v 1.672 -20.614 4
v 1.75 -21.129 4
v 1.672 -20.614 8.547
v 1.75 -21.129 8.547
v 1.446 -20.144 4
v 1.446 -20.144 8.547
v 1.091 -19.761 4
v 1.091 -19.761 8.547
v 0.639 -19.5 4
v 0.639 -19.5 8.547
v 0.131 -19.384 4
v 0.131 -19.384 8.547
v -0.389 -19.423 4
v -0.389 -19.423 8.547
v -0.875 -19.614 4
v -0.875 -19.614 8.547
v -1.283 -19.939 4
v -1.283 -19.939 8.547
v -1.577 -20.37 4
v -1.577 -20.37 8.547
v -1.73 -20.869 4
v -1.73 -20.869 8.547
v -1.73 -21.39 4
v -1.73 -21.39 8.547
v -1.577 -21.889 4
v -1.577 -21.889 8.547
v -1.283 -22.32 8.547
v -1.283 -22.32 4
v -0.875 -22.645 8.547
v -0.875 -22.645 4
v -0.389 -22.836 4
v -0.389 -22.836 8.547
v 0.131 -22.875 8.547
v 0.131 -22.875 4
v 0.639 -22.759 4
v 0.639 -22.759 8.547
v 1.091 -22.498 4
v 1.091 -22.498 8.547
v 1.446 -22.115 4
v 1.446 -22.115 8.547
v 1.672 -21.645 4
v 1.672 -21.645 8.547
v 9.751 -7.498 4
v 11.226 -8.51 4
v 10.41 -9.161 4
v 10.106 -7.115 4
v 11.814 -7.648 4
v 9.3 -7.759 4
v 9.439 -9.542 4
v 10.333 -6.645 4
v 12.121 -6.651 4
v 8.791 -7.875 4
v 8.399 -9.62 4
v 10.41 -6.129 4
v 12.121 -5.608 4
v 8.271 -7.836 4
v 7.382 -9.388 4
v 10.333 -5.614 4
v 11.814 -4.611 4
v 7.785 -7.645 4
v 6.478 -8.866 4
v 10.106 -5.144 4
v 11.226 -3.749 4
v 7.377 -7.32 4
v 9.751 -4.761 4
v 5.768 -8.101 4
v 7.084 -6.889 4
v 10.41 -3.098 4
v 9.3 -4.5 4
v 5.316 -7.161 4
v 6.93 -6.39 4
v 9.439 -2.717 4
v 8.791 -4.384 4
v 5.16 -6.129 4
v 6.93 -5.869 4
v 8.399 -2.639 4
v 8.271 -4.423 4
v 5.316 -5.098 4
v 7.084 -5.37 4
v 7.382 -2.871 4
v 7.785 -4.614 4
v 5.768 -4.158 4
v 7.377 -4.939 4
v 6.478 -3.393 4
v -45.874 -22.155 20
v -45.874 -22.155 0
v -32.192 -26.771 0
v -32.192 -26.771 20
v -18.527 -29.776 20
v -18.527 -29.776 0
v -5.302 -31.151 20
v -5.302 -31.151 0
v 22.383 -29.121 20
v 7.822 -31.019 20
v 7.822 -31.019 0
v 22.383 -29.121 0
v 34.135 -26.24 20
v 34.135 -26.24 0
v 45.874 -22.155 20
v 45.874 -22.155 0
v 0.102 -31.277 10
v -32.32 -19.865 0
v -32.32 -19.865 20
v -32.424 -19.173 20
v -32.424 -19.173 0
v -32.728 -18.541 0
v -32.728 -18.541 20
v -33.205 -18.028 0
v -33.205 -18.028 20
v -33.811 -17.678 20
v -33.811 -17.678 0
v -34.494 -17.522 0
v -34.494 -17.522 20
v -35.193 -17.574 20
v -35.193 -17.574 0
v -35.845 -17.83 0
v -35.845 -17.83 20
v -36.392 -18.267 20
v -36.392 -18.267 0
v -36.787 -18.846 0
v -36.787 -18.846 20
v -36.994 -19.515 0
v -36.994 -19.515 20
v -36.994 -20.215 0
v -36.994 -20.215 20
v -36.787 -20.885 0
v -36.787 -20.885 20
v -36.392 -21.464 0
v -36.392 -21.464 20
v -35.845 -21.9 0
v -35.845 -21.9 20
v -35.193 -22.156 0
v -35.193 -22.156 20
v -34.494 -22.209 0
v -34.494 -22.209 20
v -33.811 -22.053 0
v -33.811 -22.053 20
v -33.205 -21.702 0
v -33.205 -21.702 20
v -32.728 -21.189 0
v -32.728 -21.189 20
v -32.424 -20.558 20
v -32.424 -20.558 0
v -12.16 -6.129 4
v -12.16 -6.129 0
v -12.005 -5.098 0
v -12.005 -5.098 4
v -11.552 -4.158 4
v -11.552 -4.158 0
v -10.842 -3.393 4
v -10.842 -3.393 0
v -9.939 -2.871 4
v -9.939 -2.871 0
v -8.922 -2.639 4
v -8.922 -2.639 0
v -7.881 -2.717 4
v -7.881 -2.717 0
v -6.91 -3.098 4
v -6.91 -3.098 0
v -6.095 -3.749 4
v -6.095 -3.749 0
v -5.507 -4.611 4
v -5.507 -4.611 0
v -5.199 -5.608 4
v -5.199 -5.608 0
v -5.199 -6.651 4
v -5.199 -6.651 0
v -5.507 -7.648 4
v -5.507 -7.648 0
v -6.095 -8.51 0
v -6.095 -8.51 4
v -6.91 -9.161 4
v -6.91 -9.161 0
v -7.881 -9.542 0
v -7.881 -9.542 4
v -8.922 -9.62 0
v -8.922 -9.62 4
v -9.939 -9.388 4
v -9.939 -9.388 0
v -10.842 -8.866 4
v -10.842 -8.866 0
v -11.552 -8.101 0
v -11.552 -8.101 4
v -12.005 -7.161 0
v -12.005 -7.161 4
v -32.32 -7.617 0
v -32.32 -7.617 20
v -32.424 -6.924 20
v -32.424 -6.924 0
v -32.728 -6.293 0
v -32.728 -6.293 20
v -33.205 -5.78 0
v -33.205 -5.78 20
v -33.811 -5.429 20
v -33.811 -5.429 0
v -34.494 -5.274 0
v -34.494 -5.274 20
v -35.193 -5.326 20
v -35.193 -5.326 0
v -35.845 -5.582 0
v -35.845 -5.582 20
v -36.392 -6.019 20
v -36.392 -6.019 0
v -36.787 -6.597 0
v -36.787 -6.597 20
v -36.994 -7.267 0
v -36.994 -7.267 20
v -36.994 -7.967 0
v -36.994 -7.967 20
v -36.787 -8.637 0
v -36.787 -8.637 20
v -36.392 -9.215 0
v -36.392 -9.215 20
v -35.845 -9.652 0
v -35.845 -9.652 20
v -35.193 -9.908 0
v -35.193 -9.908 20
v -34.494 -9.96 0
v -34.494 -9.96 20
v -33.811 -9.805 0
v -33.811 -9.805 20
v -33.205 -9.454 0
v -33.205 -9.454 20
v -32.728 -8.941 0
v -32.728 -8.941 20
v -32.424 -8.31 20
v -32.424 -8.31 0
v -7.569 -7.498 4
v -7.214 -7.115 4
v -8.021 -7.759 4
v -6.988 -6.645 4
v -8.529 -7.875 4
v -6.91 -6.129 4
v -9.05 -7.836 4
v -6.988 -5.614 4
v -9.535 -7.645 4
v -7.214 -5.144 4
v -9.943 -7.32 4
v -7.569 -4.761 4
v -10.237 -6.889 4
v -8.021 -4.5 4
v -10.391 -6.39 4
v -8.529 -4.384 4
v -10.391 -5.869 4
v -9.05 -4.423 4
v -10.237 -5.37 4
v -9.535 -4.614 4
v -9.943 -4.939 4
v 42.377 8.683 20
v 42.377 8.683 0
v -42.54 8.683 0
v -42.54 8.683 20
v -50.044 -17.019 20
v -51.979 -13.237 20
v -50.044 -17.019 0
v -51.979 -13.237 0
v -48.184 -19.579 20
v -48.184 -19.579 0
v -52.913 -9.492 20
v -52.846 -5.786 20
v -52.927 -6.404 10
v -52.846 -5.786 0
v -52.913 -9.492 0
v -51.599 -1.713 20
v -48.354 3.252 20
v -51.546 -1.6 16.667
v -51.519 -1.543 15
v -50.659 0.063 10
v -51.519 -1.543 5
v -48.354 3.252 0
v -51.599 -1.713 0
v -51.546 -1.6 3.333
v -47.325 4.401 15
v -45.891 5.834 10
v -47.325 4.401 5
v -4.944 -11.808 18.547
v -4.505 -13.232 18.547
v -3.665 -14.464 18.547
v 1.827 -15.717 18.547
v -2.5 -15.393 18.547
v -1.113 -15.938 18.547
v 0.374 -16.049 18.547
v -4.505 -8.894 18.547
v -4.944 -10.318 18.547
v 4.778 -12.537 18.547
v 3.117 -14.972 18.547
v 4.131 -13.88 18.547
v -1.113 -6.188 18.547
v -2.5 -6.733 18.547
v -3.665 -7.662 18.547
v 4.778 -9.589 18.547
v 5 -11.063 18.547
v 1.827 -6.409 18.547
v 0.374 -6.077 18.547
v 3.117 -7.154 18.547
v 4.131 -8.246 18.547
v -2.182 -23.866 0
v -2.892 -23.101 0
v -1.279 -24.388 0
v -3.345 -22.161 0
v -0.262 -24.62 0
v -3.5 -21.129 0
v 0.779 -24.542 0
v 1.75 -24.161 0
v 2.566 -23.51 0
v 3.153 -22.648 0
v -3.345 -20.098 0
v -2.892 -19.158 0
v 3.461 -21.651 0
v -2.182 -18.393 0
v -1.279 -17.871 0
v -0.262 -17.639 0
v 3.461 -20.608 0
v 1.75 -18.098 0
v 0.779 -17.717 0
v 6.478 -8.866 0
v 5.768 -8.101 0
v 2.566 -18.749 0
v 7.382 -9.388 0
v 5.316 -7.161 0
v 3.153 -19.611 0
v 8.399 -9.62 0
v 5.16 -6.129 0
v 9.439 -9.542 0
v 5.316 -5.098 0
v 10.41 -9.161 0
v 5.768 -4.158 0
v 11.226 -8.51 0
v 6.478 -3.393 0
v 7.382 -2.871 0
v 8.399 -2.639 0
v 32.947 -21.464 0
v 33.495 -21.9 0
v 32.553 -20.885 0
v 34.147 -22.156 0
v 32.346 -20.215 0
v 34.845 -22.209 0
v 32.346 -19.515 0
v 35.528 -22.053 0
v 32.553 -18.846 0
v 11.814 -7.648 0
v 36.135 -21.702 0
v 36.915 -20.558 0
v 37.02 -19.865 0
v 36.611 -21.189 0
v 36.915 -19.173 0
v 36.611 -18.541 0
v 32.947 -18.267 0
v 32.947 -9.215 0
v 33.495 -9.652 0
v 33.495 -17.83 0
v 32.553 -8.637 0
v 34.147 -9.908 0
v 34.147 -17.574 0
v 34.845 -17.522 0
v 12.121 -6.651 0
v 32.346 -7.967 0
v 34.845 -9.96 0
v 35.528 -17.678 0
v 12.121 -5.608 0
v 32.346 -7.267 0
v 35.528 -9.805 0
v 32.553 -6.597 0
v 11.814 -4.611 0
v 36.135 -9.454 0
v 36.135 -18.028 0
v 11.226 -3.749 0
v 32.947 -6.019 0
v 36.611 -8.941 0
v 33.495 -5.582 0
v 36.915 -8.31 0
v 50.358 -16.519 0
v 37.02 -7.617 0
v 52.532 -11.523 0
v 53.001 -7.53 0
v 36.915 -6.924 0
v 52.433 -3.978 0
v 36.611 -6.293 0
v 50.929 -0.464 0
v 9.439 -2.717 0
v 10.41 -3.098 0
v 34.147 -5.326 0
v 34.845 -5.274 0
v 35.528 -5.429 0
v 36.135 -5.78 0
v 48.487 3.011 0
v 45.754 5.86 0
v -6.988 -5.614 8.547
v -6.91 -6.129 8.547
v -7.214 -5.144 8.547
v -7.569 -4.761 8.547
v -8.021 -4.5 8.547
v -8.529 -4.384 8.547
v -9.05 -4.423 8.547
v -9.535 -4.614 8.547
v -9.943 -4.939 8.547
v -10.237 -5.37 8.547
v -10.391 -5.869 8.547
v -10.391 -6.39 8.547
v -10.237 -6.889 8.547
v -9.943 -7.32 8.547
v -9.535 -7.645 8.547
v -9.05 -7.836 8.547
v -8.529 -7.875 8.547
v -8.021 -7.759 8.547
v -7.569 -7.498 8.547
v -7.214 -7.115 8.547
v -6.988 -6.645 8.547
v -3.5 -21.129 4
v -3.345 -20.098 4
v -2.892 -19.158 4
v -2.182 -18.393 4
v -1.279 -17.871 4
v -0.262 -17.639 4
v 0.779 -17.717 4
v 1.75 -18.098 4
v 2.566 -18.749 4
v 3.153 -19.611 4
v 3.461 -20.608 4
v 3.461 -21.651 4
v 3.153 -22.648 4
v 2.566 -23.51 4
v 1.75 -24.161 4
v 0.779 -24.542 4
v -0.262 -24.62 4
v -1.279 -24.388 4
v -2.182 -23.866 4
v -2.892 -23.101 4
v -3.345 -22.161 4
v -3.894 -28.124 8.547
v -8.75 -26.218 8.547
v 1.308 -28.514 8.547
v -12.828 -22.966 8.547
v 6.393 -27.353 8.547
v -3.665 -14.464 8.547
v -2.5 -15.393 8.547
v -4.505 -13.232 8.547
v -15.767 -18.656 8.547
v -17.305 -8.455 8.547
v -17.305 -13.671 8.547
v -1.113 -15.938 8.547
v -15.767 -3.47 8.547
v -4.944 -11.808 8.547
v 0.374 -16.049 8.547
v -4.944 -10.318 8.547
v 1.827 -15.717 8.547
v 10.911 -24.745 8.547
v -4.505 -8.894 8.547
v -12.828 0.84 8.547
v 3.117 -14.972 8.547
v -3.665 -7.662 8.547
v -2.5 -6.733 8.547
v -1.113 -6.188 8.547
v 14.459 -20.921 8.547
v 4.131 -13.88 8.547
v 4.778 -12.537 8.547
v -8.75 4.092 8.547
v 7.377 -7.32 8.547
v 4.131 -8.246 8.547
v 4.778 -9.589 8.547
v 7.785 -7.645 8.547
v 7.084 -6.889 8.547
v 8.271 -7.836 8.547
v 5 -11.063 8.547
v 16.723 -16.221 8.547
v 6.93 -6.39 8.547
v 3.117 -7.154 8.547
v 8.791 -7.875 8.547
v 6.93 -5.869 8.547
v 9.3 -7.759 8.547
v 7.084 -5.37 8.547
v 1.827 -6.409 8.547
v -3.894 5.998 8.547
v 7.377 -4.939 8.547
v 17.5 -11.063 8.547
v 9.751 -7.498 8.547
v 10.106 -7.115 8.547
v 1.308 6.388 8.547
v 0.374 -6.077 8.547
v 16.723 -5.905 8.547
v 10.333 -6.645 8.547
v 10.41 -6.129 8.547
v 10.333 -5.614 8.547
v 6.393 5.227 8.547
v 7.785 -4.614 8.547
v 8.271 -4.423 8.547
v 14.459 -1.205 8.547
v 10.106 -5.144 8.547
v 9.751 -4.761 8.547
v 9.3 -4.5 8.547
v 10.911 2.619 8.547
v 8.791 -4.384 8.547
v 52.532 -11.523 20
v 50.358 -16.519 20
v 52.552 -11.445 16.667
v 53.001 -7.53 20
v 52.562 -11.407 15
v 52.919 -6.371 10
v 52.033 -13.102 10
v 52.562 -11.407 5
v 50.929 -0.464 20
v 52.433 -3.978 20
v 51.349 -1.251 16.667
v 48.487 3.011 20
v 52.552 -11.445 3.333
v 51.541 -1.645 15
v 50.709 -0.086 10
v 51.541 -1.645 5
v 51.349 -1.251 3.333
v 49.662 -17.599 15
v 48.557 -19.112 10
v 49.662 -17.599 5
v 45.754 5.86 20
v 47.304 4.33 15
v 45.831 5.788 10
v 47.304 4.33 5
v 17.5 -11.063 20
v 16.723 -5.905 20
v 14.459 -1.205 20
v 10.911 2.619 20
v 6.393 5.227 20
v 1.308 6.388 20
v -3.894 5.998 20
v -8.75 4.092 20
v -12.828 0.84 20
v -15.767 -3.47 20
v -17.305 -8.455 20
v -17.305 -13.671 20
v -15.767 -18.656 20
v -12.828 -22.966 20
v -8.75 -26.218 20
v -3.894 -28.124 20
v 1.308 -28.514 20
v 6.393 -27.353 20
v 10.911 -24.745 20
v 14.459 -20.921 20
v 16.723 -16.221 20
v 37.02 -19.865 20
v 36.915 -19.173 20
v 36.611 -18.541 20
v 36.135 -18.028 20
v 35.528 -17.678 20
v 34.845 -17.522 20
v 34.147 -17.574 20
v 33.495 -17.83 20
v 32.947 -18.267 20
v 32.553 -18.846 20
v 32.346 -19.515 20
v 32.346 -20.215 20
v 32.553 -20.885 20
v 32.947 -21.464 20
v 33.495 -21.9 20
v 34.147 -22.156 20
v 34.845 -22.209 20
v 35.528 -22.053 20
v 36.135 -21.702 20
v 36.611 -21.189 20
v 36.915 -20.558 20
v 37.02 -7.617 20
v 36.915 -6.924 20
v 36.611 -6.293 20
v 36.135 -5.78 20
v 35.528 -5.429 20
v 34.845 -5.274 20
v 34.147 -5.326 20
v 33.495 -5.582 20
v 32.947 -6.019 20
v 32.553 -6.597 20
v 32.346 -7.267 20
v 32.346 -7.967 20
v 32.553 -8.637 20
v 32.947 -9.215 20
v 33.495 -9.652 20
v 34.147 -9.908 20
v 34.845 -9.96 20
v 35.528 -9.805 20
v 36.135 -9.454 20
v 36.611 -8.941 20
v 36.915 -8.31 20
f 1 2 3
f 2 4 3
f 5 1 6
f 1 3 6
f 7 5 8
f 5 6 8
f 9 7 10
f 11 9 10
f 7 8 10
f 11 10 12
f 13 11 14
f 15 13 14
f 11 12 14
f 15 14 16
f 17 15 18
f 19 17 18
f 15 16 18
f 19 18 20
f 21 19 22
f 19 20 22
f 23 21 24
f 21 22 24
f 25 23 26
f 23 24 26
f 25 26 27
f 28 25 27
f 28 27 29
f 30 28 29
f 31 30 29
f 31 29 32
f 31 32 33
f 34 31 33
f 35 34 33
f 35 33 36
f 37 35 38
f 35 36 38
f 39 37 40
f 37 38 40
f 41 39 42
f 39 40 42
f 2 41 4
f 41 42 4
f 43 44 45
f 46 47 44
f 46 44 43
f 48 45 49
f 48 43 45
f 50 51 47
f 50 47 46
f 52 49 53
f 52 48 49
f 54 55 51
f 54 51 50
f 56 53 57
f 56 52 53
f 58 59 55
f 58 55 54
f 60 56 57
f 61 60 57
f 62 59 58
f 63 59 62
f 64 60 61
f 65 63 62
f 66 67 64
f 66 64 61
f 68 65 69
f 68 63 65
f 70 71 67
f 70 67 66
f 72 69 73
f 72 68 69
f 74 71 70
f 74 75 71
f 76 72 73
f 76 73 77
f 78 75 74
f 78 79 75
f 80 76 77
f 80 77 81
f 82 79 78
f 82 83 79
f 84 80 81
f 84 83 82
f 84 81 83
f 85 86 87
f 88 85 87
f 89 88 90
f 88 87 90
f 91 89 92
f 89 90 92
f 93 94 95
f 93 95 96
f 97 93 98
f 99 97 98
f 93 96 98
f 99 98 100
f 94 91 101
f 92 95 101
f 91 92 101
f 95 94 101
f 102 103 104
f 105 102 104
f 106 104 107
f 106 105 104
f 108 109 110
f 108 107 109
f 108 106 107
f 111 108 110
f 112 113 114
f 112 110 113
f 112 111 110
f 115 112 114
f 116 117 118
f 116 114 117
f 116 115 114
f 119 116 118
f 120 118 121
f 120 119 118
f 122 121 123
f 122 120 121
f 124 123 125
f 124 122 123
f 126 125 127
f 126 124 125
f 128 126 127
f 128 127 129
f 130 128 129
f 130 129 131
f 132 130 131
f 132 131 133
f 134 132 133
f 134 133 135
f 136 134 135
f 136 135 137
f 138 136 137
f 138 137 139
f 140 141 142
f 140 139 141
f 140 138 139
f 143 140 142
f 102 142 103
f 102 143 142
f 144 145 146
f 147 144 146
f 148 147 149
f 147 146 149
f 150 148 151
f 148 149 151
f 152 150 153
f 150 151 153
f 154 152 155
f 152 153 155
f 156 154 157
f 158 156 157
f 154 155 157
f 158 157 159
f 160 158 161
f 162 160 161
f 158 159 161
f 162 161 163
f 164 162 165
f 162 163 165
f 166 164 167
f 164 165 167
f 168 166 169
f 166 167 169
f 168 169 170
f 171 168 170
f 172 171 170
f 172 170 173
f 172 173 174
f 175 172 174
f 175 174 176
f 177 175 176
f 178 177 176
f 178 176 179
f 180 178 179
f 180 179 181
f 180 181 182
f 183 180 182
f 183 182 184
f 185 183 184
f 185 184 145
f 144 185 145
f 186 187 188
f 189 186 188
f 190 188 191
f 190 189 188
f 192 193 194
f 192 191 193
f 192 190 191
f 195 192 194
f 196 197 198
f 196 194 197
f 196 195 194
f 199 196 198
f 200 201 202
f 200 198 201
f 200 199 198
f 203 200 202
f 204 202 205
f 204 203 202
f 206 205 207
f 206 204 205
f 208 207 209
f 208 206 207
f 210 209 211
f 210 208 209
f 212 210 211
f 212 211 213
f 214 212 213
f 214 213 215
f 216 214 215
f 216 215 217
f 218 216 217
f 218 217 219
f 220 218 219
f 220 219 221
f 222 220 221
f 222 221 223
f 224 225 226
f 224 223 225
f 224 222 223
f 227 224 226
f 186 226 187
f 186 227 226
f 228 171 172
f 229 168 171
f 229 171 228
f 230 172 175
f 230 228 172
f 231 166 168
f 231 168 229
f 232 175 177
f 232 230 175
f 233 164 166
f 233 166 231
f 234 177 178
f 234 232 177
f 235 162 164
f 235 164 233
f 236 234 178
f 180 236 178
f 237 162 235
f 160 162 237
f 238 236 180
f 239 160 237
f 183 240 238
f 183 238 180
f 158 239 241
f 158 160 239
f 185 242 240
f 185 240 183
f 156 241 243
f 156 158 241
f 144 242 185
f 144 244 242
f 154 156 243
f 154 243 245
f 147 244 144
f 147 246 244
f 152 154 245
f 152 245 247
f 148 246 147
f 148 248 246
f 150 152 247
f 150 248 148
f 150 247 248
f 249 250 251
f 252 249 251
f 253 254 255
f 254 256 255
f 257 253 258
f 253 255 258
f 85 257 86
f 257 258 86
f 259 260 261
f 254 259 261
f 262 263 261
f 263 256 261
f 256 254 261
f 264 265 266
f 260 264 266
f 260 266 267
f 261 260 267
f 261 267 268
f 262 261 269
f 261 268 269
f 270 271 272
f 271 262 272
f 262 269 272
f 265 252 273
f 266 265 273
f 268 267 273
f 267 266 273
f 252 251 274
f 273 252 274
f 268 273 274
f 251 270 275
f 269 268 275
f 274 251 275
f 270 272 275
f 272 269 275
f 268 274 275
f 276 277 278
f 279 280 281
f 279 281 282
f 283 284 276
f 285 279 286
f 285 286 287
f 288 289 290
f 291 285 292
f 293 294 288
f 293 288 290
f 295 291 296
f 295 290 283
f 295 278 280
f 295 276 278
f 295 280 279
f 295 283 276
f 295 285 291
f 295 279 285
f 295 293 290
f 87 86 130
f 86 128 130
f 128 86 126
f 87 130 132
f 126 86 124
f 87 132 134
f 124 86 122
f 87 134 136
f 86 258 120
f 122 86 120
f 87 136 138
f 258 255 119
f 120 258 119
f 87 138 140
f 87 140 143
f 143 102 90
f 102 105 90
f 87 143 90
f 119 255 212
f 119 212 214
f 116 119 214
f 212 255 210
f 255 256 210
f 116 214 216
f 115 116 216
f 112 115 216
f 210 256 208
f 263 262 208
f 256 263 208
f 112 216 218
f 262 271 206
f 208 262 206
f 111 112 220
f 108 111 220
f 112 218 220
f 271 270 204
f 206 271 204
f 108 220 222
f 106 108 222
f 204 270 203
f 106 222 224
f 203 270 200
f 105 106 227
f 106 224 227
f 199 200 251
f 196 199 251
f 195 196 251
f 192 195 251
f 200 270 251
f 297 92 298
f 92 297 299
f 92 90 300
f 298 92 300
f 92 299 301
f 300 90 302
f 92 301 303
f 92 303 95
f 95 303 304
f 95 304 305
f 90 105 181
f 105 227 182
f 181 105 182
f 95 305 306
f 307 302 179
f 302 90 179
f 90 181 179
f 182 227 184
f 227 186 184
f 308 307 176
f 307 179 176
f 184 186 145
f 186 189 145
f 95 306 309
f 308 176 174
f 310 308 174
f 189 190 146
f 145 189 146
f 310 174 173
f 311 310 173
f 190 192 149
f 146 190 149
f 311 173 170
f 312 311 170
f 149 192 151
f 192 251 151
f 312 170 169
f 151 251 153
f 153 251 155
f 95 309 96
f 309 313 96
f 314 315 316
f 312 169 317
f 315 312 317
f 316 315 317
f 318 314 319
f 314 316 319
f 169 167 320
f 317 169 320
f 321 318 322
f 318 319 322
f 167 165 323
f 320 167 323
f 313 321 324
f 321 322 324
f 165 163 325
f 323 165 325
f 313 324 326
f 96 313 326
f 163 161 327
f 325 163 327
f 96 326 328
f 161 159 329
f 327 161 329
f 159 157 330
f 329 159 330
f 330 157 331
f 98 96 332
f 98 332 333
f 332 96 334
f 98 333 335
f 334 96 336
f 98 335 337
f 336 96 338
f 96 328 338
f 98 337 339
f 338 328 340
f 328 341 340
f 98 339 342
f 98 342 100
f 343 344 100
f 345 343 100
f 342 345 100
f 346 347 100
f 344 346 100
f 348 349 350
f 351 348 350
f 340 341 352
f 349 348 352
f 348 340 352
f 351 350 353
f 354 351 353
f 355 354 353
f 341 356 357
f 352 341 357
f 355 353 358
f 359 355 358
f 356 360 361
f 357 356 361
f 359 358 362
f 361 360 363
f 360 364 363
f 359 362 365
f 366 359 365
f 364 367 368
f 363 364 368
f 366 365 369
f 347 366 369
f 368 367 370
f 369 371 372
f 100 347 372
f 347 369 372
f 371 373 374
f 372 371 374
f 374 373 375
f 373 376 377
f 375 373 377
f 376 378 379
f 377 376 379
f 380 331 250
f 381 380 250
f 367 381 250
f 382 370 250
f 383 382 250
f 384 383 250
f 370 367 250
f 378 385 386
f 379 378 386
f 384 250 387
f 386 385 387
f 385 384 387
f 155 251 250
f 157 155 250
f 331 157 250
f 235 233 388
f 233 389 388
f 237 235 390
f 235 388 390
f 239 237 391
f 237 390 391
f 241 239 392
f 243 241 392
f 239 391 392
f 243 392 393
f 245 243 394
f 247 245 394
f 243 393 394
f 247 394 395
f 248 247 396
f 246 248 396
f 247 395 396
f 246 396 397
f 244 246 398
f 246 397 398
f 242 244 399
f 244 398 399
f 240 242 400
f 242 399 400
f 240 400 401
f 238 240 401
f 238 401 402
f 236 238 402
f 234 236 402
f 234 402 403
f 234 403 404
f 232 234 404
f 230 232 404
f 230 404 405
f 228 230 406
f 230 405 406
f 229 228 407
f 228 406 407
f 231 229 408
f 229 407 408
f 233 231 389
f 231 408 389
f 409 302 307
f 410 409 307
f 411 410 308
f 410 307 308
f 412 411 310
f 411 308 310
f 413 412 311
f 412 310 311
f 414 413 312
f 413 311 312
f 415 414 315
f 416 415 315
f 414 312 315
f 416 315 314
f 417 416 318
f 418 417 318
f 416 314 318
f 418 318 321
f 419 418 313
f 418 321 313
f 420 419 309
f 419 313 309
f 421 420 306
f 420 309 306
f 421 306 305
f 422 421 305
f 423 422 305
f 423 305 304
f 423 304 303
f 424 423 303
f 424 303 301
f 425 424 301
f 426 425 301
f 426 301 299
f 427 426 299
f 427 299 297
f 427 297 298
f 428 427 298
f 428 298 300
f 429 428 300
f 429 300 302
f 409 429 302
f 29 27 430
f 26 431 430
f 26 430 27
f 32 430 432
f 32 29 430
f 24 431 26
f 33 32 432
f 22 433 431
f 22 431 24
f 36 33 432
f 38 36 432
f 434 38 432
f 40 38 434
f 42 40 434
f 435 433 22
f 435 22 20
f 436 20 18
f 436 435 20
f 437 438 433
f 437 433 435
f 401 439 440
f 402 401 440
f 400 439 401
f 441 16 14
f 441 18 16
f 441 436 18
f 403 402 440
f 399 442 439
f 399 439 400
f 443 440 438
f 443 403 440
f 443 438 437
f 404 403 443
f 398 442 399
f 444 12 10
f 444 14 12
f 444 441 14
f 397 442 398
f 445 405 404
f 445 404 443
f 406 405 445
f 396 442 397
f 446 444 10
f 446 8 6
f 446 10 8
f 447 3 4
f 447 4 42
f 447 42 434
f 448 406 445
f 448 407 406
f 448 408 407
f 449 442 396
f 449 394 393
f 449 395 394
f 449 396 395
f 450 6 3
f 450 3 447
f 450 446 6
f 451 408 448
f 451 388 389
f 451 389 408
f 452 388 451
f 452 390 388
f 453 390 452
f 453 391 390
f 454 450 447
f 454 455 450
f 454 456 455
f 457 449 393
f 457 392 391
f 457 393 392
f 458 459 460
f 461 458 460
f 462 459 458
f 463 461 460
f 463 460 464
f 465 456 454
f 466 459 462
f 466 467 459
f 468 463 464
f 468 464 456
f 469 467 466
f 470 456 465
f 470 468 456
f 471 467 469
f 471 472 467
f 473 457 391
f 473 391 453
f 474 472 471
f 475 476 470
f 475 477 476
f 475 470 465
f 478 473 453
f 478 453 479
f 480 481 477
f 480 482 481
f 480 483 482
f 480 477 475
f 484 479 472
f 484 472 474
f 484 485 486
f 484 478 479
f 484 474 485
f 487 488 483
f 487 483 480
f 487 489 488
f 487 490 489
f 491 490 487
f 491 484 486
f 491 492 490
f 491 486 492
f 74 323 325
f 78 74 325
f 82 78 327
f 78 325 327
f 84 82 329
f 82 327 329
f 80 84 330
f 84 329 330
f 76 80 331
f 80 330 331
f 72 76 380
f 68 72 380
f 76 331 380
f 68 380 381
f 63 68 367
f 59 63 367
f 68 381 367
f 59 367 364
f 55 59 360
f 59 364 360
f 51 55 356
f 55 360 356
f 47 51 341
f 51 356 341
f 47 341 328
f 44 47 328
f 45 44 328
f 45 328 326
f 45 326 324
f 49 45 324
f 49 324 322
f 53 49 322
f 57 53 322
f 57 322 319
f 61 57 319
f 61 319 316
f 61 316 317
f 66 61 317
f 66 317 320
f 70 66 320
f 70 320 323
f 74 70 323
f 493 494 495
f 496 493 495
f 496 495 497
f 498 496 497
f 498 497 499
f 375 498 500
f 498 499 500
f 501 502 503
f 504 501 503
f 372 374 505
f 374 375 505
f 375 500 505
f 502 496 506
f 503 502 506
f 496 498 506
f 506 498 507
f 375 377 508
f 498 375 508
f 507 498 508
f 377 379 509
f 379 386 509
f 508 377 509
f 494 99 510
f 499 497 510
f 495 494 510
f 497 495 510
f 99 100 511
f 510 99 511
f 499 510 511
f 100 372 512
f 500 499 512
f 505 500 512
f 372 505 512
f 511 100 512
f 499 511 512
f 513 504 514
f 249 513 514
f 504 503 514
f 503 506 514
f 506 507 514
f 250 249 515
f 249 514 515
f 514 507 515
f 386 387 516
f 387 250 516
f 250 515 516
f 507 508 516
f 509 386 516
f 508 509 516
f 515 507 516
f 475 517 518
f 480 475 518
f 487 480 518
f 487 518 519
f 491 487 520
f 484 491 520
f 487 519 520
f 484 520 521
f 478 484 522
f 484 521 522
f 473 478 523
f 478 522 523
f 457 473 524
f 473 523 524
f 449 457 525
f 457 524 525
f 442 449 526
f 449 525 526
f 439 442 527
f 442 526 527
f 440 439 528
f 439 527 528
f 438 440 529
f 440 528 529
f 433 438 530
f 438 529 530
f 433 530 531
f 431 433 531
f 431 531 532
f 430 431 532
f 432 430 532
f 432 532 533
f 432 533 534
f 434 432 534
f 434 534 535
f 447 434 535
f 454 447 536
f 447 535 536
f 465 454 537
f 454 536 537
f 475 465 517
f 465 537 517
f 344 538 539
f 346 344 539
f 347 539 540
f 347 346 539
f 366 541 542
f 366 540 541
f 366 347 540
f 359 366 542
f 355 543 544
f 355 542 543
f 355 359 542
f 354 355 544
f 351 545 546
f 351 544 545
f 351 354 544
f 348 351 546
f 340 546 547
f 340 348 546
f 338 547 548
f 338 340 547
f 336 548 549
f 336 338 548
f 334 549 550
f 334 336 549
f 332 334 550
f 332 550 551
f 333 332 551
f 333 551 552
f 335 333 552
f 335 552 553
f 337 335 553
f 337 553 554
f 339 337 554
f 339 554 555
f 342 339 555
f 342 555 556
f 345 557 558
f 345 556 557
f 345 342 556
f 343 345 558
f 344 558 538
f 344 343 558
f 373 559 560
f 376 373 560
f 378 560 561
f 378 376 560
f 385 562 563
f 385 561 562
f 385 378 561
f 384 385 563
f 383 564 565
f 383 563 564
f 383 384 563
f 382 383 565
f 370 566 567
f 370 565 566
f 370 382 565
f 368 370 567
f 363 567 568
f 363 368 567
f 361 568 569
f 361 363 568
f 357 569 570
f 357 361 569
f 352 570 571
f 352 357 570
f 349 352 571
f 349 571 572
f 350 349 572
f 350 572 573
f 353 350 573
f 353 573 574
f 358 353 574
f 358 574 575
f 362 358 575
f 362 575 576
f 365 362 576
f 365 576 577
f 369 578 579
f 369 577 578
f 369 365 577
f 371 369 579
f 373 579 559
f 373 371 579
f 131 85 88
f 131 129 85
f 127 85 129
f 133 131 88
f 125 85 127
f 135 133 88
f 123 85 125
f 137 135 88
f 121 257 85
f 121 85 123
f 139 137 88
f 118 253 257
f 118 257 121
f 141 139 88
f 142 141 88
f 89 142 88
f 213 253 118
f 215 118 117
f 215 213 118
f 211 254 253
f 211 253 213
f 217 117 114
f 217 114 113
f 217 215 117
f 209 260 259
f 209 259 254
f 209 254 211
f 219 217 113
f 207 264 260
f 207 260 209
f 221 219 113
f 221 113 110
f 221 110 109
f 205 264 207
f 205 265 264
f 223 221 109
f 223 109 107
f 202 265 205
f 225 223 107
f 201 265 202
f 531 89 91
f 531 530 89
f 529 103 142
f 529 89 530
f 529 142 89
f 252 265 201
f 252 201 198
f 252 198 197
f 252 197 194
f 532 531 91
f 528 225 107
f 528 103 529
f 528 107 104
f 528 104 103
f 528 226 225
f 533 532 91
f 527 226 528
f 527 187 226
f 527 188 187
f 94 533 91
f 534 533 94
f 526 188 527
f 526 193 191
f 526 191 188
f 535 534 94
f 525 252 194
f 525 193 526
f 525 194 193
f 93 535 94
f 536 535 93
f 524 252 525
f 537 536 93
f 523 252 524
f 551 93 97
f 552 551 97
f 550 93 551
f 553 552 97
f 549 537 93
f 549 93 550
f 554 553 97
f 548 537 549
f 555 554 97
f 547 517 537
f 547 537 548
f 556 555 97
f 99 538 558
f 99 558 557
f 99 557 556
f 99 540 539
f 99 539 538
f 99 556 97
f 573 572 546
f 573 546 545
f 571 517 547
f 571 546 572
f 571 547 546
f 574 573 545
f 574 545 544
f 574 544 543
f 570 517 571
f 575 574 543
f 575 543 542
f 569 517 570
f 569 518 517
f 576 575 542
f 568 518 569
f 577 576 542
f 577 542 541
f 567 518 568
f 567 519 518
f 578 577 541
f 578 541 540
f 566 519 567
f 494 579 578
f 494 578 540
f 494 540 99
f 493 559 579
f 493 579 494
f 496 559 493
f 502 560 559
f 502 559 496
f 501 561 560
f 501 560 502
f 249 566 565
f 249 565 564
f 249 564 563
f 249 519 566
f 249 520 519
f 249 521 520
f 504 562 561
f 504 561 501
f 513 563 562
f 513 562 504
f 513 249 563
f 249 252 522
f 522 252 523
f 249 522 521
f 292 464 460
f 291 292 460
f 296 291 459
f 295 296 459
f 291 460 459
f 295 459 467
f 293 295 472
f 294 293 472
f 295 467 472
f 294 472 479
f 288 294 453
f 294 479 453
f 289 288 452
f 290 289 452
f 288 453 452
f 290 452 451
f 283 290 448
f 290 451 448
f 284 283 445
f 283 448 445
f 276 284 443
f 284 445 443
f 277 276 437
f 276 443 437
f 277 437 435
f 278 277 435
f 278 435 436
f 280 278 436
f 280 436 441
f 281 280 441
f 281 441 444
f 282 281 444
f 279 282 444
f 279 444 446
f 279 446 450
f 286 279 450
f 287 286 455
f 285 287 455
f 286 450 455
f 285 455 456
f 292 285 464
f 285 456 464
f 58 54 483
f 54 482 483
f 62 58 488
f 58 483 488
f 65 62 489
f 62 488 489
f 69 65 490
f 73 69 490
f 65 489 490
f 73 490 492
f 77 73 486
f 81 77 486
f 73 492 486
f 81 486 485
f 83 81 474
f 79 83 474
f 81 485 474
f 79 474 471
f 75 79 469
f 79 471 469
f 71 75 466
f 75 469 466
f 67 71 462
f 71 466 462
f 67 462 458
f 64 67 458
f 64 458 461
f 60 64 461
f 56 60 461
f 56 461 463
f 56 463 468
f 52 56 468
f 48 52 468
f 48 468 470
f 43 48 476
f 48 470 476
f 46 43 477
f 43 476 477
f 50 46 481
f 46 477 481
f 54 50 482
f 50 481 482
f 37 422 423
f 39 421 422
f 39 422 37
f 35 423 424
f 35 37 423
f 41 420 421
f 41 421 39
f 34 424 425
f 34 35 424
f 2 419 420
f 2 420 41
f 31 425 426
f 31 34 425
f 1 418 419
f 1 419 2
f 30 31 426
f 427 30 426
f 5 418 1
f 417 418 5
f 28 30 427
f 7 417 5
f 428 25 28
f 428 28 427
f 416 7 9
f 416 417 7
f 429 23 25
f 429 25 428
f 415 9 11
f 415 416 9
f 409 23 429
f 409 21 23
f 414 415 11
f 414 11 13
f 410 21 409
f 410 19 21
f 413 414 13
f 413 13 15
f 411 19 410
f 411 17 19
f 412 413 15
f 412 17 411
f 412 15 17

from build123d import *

# Parameters (mm, degrees)
BOSS_EXTRUDE1_DEPTH                              = 20
SKETCH4_R                                        = 17.5
CUT_EXTRUDE1_DEPTH                               = 11.453250926
SKETCH5_R                                        = 5
BOSS_EXTRUDE2_DEPTH                              = 10
CBORE_FOR_M5_HEX_HEAD_MACHINE_SCREW2_D           = 3.5
CBORE_FOR_M5_HEX_HEAD_MACHINE_SCREW2_DEPTH       = 11
CBORE_FOR_M5_HEX_HEAD_MACHINE_SCREW2_CBORE_D     = 7
CBORE_FOR_M5_HEX_HEAD_MACHINE_SCREW2_CBORE_DEPTH = 4
CBORE_FOR_M5_HEX_HEAD_MACHINE_SCREW2_TIP         = 1.75
CUT_EXTRUDE2_DEPTH                               = 65.71473925
CUT_EXTRUDE2_DEPTH_BACK                          = 65.71473925
SKETCH11_R                                       = 2.35


with BuildPart() as part:
    # Sketch2 → Boss-Extrude1 (new body)
    with BuildSketch(Plane.XY):
        with BuildLine():
            Line((42.376776125, 8.683218748), (-42.540089832, 8.683218747))
            add(Edge.make_bspline(
                [(-42.540089832, 8.683218747), (-61.647606257, -6.072667773), (-45.873698376, -22.15549797)],
                knots=[0, 0, 0, 1, 1, 1], degree=2))
            add(Edge.make_bspline(
                [(-45.873698376, -22.15549797), (0.203235462, -40.398996626), (45.873698397, -22.155497949)],
                knots=[0, 0, 0, 1, 1, 1], degree=2))
            add(Edge.make_bspline(
                [(45.873698397, -22.155497949), (61.713202875, -6.005950809), (42.376776125, 8.683218748)],
                knots=[0, 0, 0, 1, 1, 1], degree=2))
        make_face()
    extrude(amount=BOSS_EXTRUDE1_DEPTH)

    # Sketch4 → Cut-Extrude1 (cut)
    with BuildSketch(Plane.XY.offset(20)):
        with Locations((0, -11.063024907)):
            Circle(SKETCH4_R)
    extrude(amount=-CUT_EXTRUDE1_DEPTH, mode=Mode.SUBTRACT)

    # Sketch5 → Boss-Extrude2 (add)
    with BuildSketch(Plane.XY.offset(8.546749074)):
        with Locations((0, -11.063024907)):
            Circle(SKETCH5_R)
    extrude(amount=BOSS_EXTRUDE2_DEPTH)

    # CBORE for M5 Hex Head Machine Screw2
    with Locations(Plane(origin=(0, 0, 0), x_dir=(-1, 0, 0), z_dir=(0, 0, -1))):
        with Locations((-8.660254038, -6.129479586), (0, -21.129479586), (8.660254038, -6.129479586)):
            CounterBoreHole(CBORE_FOR_M5_HEX_HEAD_MACHINE_SCREW2_D / 2, CBORE_FOR_M5_HEX_HEAD_MACHINE_SCREW2_CBORE_D / 2, CBORE_FOR_M5_HEX_HEAD_MACHINE_SCREW2_CBORE_DEPTH, depth=CBORE_FOR_M5_HEX_HEAD_MACHINE_SCREW2_DEPTH)
            with Locations((0, 0, -(CBORE_FOR_M5_HEX_HEAD_MACHINE_SCREW2_DEPTH + CBORE_FOR_M5_HEX_HEAD_MACHINE_SCREW2_TIP / 2))):  # 90° drill point
                Cone(0, CBORE_FOR_M5_HEX_HEAD_MACHINE_SCREW2_D / 2, CBORE_FOR_M5_HEX_HEAD_MACHINE_SCREW2_TIP, mode=Mode.SUBTRACT)

    # Sketch11 → Cut-Extrude2 (cut, two sides: drawn at the far end of the back side and taken through both)
    with BuildSketch(Plane.XY.offset(20).offset(-CUT_EXTRUDE2_DEPTH_BACK)):
        with Locations((-34.669778537, -19.865188652)):
            Circle(SKETCH11_R)
        with Locations((-34.669778537, -7.616948648)):
            Circle(SKETCH11_R)
        with Locations((34.669778537, -7.616948648)):
            Circle(SKETCH11_R)
        with Locations((34.669778537, -19.865188652)):
            Circle(SKETCH11_R)
    extrude(amount=CUT_EXTRUDE2_DEPTH + CUT_EXTRUDE2_DEPTH_BACK, mode=Mode.SUBTRACT)


solid = part.part
